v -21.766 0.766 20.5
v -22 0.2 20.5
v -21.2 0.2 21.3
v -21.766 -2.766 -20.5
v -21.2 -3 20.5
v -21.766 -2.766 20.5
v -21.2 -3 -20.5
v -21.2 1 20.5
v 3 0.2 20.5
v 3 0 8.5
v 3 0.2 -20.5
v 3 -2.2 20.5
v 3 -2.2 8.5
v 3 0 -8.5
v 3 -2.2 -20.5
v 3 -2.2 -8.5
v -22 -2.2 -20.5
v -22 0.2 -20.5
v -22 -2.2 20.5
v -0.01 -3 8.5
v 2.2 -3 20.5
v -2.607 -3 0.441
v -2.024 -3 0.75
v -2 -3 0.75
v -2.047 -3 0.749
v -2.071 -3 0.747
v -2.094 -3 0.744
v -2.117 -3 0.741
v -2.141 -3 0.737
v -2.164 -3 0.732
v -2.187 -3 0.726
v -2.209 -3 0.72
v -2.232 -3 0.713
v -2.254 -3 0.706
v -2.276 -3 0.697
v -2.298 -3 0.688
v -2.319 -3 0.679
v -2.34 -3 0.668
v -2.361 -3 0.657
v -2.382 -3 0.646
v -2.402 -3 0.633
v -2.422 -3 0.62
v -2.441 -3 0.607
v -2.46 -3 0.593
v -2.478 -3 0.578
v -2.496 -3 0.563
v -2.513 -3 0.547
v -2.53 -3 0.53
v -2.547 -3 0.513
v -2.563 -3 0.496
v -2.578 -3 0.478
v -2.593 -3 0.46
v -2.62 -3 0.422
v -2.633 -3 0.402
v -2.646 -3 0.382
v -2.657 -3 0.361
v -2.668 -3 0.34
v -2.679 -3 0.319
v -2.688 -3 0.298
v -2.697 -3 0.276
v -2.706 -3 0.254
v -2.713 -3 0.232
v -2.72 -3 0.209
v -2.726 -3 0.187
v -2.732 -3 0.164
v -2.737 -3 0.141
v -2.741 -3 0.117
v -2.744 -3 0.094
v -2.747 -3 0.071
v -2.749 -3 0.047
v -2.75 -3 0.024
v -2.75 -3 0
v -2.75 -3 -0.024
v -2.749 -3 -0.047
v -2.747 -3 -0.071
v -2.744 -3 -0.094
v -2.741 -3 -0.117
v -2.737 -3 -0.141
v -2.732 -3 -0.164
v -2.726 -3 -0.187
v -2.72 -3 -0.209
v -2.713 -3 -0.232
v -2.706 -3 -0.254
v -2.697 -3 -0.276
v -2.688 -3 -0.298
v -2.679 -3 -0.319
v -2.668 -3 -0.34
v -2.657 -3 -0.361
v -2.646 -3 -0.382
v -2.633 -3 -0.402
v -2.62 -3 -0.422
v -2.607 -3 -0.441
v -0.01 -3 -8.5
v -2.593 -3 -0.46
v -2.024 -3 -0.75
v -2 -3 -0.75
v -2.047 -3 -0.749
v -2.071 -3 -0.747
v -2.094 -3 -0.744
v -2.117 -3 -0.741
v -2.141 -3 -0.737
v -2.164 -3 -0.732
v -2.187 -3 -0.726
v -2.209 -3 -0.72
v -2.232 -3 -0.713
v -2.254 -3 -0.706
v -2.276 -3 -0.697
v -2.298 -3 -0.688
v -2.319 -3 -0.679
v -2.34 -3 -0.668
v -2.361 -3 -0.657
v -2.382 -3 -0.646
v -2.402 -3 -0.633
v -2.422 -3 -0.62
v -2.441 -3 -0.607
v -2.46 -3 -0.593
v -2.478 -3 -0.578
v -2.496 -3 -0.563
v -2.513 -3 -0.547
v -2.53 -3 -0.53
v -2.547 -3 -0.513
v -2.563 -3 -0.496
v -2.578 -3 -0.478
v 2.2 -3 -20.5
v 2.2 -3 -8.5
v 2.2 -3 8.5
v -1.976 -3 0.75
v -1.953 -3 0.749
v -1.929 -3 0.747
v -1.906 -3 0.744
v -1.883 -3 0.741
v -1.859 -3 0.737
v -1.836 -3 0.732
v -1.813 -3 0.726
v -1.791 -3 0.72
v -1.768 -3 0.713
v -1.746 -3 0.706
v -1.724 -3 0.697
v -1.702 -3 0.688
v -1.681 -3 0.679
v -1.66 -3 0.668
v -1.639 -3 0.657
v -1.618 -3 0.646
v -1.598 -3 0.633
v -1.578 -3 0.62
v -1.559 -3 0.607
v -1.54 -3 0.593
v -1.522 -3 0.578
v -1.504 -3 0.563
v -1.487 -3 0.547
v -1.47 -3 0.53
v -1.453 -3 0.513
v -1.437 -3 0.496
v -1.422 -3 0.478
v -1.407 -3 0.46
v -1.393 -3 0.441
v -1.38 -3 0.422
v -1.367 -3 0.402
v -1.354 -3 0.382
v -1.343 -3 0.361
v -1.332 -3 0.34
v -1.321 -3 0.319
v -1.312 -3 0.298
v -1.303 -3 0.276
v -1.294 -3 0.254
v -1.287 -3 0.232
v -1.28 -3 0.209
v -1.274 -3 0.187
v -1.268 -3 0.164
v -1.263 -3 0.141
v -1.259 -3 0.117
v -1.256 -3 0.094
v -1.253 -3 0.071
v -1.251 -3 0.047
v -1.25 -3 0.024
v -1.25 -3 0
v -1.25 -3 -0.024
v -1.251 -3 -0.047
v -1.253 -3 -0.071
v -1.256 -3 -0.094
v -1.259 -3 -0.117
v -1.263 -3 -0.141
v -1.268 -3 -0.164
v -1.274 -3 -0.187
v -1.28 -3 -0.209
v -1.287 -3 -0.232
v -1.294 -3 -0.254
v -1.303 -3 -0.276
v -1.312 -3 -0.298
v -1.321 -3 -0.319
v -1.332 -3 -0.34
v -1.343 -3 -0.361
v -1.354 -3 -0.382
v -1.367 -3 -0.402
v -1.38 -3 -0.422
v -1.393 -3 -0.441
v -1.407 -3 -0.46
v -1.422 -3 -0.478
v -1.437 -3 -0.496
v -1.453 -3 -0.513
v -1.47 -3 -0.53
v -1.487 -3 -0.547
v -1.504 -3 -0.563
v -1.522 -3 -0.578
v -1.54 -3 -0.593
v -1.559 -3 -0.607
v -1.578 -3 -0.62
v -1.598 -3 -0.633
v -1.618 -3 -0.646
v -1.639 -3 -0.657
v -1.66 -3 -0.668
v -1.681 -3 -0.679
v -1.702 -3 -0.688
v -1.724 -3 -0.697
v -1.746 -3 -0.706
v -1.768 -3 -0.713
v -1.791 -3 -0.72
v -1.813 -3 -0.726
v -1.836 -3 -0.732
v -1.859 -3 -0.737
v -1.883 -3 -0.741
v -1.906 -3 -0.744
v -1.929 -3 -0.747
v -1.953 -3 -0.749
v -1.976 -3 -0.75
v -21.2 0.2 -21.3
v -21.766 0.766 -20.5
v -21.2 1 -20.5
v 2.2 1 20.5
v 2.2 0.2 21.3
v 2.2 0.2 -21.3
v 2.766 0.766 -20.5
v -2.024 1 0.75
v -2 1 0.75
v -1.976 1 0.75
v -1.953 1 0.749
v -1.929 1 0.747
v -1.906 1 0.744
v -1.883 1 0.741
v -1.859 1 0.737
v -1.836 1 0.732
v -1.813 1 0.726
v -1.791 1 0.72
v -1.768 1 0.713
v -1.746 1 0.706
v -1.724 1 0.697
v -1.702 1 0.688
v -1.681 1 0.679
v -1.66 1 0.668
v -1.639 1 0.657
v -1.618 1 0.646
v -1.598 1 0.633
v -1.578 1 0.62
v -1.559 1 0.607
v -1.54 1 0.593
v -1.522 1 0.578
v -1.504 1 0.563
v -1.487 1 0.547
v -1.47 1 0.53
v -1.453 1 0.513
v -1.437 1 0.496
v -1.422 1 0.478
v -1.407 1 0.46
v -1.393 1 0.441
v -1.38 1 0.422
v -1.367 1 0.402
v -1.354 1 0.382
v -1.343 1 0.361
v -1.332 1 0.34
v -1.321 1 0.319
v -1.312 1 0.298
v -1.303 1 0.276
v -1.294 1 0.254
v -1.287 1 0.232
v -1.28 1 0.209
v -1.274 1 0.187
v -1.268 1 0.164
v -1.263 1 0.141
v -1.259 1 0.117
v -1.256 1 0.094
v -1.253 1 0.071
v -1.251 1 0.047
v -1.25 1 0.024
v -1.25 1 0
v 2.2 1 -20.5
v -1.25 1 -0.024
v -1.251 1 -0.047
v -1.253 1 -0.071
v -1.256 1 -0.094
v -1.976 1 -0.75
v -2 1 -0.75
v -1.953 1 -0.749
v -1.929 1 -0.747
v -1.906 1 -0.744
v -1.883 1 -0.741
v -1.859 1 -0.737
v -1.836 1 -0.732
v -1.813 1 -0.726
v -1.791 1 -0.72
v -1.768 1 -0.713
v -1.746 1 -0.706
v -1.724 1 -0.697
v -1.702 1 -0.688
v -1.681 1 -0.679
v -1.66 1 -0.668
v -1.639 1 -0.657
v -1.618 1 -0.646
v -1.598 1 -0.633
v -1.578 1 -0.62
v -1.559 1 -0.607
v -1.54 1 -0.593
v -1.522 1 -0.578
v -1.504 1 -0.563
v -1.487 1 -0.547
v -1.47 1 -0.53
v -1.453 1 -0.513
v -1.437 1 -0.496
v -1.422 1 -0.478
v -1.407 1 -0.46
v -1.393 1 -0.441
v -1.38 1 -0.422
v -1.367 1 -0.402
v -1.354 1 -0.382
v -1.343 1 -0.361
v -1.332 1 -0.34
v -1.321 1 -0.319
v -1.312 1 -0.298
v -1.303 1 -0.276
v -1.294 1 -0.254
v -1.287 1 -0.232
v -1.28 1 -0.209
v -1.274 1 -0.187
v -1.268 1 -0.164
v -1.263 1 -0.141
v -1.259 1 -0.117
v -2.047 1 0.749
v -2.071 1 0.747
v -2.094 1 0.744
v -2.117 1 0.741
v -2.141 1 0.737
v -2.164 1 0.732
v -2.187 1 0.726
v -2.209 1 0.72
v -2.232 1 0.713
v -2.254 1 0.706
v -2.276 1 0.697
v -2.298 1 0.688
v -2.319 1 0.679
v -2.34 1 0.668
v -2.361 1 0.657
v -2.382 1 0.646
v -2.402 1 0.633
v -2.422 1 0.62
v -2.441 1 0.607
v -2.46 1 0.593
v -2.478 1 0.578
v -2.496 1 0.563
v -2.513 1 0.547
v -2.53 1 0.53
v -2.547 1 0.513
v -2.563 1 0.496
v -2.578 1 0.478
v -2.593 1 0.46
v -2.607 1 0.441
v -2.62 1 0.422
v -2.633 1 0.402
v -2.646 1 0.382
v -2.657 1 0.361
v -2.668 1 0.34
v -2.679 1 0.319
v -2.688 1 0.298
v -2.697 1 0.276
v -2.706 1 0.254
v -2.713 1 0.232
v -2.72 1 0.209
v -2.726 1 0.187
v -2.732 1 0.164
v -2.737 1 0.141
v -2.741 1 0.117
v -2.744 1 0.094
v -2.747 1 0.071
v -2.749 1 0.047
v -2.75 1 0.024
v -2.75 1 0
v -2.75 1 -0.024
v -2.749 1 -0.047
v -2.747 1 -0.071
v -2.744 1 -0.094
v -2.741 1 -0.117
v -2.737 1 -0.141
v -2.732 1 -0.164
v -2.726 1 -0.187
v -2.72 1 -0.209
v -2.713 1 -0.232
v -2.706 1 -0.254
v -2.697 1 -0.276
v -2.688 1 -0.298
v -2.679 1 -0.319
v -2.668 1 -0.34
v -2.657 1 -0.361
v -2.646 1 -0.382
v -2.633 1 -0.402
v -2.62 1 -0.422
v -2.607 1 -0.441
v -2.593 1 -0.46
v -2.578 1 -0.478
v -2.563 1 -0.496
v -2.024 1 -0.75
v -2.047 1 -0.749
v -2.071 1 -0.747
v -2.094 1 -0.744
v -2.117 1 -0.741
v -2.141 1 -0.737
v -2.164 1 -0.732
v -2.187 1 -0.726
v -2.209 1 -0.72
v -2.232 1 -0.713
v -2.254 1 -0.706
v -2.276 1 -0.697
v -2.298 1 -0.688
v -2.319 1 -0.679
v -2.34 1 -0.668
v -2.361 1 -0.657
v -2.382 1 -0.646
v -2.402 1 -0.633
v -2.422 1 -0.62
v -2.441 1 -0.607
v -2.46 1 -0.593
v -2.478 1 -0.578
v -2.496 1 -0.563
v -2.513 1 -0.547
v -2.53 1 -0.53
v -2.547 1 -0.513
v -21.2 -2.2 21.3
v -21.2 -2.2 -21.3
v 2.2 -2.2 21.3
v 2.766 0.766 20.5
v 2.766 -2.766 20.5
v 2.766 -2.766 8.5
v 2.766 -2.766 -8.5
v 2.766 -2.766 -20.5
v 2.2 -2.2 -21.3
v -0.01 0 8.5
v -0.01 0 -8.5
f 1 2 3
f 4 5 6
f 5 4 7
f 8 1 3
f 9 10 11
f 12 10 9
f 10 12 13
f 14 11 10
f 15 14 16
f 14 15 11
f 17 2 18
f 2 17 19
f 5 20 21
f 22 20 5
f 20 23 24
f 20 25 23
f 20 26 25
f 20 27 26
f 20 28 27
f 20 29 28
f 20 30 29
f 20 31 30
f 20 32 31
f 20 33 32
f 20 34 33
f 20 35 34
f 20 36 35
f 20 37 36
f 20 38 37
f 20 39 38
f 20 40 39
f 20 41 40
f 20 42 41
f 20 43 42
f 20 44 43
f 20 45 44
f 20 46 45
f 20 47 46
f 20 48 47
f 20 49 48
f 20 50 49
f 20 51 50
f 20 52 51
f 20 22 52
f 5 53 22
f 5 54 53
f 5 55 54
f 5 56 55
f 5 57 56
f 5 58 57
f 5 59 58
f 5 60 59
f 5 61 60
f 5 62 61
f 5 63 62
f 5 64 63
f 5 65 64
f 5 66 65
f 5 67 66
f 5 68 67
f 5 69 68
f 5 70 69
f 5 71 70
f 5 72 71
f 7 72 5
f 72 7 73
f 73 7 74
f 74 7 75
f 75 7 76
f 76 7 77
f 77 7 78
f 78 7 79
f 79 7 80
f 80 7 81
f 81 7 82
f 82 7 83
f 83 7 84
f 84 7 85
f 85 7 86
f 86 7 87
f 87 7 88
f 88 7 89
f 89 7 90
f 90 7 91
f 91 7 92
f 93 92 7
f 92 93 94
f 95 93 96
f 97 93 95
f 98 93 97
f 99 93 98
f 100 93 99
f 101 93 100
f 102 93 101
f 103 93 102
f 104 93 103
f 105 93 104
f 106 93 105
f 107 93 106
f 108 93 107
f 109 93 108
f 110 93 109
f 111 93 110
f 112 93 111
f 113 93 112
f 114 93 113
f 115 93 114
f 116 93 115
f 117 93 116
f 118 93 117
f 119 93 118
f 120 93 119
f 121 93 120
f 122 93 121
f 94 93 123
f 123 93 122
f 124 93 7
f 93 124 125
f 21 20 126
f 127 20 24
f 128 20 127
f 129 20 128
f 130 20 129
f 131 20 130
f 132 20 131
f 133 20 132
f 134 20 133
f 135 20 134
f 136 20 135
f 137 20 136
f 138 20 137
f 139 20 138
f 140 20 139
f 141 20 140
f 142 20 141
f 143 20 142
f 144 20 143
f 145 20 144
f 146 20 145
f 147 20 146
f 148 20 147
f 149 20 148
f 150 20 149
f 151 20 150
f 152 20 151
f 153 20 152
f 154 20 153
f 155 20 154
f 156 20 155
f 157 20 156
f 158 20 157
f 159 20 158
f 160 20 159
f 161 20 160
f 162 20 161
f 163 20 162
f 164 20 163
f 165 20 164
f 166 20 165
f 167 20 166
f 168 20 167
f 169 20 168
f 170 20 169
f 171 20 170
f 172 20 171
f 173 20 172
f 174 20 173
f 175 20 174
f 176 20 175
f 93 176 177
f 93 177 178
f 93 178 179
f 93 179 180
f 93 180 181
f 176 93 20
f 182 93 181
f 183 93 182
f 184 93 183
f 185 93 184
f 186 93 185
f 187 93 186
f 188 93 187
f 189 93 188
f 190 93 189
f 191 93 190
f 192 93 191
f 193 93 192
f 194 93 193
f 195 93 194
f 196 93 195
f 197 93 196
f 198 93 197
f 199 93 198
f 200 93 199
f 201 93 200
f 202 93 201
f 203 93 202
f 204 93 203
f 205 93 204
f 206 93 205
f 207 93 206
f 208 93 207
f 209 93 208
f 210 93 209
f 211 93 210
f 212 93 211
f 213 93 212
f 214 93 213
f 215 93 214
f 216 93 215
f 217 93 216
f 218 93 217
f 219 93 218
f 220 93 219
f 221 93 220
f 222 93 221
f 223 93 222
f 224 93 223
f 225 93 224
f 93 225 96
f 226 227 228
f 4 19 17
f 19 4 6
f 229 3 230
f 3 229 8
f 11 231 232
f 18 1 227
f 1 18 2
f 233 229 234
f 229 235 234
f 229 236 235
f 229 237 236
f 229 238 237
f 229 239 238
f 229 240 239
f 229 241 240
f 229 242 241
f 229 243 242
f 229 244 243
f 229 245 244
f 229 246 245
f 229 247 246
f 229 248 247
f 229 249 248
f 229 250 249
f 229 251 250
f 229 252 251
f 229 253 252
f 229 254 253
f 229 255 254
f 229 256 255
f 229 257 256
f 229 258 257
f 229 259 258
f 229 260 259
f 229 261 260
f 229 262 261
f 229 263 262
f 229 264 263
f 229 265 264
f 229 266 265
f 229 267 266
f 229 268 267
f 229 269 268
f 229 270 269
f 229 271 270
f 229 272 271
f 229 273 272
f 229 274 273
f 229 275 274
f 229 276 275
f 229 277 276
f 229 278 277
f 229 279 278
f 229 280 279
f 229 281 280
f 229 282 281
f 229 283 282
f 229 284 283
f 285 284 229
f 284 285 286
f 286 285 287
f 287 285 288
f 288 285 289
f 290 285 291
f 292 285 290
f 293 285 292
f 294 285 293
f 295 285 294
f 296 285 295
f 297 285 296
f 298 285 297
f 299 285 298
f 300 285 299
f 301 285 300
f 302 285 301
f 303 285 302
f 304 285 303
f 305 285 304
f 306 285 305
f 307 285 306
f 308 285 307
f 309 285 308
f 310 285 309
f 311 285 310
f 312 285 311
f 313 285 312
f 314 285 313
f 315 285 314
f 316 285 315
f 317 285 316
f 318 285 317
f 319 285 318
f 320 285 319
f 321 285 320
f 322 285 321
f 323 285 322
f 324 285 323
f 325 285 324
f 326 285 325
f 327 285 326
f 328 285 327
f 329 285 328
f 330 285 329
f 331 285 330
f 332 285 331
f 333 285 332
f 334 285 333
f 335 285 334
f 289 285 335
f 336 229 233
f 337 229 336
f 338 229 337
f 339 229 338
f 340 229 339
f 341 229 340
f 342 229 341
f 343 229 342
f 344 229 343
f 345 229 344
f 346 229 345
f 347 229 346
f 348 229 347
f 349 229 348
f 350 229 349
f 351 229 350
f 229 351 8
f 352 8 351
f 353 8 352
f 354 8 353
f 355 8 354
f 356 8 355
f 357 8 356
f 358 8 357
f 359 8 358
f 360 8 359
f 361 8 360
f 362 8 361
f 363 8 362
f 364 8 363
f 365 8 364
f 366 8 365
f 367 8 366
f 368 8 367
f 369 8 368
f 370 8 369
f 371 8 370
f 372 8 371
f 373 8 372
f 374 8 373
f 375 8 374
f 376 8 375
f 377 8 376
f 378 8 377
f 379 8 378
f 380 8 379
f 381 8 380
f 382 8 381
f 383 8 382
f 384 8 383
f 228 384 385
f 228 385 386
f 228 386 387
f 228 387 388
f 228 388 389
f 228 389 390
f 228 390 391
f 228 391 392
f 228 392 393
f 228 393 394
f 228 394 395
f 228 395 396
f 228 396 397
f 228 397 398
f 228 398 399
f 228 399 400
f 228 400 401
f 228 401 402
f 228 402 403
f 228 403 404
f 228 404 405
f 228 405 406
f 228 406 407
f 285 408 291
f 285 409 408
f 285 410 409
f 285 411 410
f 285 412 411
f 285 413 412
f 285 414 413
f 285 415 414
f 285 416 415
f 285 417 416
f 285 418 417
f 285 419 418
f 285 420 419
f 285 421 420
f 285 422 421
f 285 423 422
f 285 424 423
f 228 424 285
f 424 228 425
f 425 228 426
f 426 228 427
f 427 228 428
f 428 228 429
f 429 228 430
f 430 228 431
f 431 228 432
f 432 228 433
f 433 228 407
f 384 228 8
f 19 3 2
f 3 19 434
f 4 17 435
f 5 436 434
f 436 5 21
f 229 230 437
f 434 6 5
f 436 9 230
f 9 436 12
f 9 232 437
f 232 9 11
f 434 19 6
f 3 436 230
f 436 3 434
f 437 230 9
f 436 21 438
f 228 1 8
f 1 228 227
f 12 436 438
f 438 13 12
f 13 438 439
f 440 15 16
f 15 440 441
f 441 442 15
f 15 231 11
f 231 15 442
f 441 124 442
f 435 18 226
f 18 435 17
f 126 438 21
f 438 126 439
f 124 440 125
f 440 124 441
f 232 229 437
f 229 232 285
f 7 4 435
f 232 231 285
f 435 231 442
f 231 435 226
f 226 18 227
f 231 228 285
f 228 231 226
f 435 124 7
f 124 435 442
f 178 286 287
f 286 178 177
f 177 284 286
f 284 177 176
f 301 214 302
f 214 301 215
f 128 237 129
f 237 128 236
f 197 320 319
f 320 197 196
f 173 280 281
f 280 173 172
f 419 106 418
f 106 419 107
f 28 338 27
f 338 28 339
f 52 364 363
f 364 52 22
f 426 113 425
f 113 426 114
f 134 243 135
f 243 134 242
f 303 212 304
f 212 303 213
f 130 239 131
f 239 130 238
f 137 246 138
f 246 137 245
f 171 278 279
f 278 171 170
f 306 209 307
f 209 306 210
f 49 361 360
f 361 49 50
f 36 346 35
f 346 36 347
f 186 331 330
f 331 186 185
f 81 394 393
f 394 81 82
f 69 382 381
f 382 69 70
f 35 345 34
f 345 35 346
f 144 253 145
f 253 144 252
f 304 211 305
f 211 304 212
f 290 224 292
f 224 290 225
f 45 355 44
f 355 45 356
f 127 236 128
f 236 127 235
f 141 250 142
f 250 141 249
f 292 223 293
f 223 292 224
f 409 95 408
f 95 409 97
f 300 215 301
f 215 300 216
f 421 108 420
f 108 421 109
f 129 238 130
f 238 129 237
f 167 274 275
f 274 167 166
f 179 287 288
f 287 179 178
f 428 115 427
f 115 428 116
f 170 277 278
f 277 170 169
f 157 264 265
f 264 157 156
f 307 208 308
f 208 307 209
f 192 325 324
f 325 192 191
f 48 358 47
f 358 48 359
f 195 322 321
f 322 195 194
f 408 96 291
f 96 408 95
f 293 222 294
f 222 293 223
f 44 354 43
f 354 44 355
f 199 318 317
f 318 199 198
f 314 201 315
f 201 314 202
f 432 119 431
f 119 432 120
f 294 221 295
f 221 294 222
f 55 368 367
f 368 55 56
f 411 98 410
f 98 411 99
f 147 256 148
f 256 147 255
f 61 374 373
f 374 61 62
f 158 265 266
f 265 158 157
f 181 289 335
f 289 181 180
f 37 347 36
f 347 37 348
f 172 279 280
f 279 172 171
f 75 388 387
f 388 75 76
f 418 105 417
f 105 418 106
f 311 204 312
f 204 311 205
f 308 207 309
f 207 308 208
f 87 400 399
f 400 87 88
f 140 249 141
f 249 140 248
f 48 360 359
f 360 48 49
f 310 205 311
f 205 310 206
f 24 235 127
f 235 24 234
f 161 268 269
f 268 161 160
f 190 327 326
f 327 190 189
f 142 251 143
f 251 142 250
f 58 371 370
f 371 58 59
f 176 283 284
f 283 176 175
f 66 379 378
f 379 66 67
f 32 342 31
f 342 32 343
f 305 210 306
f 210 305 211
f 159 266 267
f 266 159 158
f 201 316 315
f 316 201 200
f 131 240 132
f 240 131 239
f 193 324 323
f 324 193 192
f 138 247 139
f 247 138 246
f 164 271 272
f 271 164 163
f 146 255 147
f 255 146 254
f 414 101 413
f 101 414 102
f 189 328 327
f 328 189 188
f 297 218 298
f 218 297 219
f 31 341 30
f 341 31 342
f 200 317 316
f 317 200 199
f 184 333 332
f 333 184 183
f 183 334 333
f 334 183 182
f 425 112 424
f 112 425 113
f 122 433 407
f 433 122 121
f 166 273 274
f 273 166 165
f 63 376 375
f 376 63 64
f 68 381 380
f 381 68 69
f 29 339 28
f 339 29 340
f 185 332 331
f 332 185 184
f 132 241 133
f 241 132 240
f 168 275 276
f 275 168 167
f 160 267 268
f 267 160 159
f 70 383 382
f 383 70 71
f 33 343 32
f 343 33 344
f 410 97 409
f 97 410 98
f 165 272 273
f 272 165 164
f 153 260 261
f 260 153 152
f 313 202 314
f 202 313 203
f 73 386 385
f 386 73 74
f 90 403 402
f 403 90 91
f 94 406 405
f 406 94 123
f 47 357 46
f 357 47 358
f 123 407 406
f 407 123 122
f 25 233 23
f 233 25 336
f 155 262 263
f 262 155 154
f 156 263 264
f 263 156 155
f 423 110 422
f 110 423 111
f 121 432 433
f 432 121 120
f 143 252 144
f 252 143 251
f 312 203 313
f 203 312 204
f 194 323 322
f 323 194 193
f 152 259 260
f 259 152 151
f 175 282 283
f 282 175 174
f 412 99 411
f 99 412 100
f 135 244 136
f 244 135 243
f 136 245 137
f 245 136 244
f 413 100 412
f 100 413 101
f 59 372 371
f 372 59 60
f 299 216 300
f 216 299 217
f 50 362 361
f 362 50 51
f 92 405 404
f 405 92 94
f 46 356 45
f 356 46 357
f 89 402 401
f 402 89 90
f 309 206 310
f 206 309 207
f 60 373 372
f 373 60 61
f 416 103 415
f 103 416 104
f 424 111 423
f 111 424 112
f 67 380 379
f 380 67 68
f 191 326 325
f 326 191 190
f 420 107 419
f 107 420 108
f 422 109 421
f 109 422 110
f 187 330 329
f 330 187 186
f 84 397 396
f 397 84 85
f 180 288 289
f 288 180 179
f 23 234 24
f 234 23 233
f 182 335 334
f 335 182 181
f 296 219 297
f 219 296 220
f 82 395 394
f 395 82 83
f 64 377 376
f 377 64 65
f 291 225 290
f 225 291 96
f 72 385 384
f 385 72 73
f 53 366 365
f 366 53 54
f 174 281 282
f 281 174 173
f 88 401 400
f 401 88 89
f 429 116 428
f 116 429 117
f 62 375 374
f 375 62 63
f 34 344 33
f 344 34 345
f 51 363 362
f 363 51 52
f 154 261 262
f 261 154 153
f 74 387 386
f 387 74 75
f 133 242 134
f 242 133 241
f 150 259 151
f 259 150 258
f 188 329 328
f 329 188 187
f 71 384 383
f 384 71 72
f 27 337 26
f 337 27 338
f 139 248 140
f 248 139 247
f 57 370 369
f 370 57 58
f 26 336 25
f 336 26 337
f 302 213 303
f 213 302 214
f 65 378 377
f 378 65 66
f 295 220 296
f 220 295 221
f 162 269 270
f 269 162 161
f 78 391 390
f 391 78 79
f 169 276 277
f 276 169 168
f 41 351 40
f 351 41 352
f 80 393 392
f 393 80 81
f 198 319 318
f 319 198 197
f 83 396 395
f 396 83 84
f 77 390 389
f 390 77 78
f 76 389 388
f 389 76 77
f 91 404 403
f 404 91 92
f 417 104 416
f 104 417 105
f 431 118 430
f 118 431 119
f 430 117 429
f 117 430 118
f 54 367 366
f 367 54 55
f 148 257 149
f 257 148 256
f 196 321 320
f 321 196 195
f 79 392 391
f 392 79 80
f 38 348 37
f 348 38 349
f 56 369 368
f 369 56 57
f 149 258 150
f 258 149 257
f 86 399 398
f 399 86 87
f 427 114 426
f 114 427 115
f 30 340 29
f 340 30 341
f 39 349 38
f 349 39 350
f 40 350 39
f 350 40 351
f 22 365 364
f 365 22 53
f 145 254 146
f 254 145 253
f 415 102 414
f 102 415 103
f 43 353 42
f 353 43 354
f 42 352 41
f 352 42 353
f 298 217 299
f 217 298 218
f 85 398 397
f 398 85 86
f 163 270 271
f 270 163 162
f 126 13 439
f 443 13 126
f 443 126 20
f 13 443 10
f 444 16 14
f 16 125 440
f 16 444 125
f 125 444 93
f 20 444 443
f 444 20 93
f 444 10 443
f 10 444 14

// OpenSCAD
// file: ../chamferer.scad
INFINITY = 10000;
ATOM = .01;

module chamfer_tool(r, fn, tool,
                    ax, ay, az,
                    ax2, ay2, az2,
                    ax3, ay3, az3) {
    rotate([ax3, ay3, az3])
    rotate([ax2, ay2, az2])
    rotate([ax, ay, az]) {
        if (tool=="sphere") {
            sphere(r, $fn=fn);
        }
        else if (tool=="hemisphere-up") {
            intersection() {
                sphere(r, $fn=fn);
                cylinder(r=r*2, h=r*2);
            }
        }
        else if (tool=="hemisphere-down") {
            difference() {
                sphere(r, $fn=fn);
                cylinder(r=r*2, h=r*2);
            }
        }
        else if (tool=="cone") {
            cylinder(r, r, 0, $fn=fn);
            scale([1, 1, -1])
            cylinder(r, r, 0, $fn=fn);
        }
        else if (tool=="cone-up") {
            cylinder(r, r, 0, $fn=fn, center=true);
        }
        else if (tool=="cone-down") {
            scale([1, 1, -1])
            cylinder(r, r, 0, $fn=fn, center=true);
        }
        else if (tool=="octahedron") {
            resize([r*2, r*2, r*2]) {
                cylinder(r, r, 0, $fn=4);
                scale([1, 1, -1])
                cylinder(r, r, 0, $fn=4);
            }
        }
        else if (tool=="pyramid") {
            resize([r*2, r*2, r*2]) {
                cylinder(r, r, 0, center=true, $fn=4);
            }
        }
        else if (tool=="rpyramid") {
            resize([r*2, r*2, r*2]) {
                cylinder(r, 0, r, center=true, $fn=4);
            }
        }
        else if (tool=="cylinder-z" || tool=="cylinder") {
            cylinder(r=r, h=ATOM, $fn=fn, center=true);
        }
        else if (tool=="cylinder-x") {
            rotate([0, 90, 0])
            cylinder(r=r, h=ATOM, $fn=fn, center=true);
        }
        else if (tool=="cylinder-y") {
            rotate([90, 0, 0])
            cylinder(r=r, h=ATOM, $fn=fn, center=true);
        }
        else if (tool=="cube") {
            cube(r*2, center=true);
        }
        else if (tool=="plate-y") {
            cube([r*2, ATOM, r*2], center=true);
        }
        else if (tool=="plate-z") {
            cube([r*2, r*2, ATOM], center=true);
        }
        else {
            assert(false, str("Unknown tool: ", tool));
        }
    }
}

module shrinker(r, tool, fn,
                ax, ay, az,
                ax2, ay2, az2,
                ax3, ay3, az3) {
    if (!r) {
        children();
    }
    else {
        // re-invert+grow = fillet
        difference() {
            cube(INFINITY/2, center=true);

            // invert+grow = carve
            minkowski() {
                difference() {
                    cube(INFINITY, center=true);
                    children();
                }
                //cube(r, center=true);
                chamfer_tool(r, fn, tool,
                             ax, ay, az,
                             ax2, ay2, az2,
                             ax3, ay3, az3);
            }
        }
    }
}

module chamferer(r, tool="sphere", fn=8, shrink=true, grow=true,
                 ax=0, ay=0, az=0,
                 ax2=0, ay2=0, az2=0,
                 ax3=0, ay3=0, az3=0,
) {
    if (!r) {
        children();
    }
    else {
        minkowski() {
            if (shrink)
                shrinker(r, tool, fn,
                         ax, ay, az,
                         ax2, ay2, az2,
                         ax3, ay3, az3) children();
            else
                children();
            
            if (grow)
                chamfer_tool(r, fn, tool,
                             ax, ay, az,
                             ax2, ay2, az2,
                             ax3, ay3, az3);
        }
    }
}



cube(50);

translate([70, 0, 0])
chamferer(5, "hemisphere-up", $preview? 6*4 : 30)
//shrinker(5, "sphere", $preview? 6*4 : 30)
cube(50);

translate([70*2, 0, 0])
chamferer(5, "octahedron", grow=false)
cube(50);
// main file
use <../chamferer.scad>;

W =   36 + 6.6;
D =    1.5;
L =   25;
CH =   0.8;
TH =   4;
PX = -22;
PZ =  -3;

ATOM = .01;
$fn  = 200;

difference() {
    chamferer($preview?0:CH, "cone") {
        // spring
        translate([0, 0, -W/2])
        linear_extrude(W)
        translate([-32, -287.5 +.07, 0])
        import("clip.dxf");

        // plate
        translate([PX, PZ, -W/2])
        cube([L, TH, W]);
    }
    
    // screw passage
    translate([PX + L -5, PZ -.5, 0]) rotate([-90, 0, 0])
    cylinder(d=D, h=TH*5+1);
    
    // screw head passage
    p = 15;
    h = 17;
    translate([-ATOM, -p, -h/2])
    cube([L*2, p, h]);
}
